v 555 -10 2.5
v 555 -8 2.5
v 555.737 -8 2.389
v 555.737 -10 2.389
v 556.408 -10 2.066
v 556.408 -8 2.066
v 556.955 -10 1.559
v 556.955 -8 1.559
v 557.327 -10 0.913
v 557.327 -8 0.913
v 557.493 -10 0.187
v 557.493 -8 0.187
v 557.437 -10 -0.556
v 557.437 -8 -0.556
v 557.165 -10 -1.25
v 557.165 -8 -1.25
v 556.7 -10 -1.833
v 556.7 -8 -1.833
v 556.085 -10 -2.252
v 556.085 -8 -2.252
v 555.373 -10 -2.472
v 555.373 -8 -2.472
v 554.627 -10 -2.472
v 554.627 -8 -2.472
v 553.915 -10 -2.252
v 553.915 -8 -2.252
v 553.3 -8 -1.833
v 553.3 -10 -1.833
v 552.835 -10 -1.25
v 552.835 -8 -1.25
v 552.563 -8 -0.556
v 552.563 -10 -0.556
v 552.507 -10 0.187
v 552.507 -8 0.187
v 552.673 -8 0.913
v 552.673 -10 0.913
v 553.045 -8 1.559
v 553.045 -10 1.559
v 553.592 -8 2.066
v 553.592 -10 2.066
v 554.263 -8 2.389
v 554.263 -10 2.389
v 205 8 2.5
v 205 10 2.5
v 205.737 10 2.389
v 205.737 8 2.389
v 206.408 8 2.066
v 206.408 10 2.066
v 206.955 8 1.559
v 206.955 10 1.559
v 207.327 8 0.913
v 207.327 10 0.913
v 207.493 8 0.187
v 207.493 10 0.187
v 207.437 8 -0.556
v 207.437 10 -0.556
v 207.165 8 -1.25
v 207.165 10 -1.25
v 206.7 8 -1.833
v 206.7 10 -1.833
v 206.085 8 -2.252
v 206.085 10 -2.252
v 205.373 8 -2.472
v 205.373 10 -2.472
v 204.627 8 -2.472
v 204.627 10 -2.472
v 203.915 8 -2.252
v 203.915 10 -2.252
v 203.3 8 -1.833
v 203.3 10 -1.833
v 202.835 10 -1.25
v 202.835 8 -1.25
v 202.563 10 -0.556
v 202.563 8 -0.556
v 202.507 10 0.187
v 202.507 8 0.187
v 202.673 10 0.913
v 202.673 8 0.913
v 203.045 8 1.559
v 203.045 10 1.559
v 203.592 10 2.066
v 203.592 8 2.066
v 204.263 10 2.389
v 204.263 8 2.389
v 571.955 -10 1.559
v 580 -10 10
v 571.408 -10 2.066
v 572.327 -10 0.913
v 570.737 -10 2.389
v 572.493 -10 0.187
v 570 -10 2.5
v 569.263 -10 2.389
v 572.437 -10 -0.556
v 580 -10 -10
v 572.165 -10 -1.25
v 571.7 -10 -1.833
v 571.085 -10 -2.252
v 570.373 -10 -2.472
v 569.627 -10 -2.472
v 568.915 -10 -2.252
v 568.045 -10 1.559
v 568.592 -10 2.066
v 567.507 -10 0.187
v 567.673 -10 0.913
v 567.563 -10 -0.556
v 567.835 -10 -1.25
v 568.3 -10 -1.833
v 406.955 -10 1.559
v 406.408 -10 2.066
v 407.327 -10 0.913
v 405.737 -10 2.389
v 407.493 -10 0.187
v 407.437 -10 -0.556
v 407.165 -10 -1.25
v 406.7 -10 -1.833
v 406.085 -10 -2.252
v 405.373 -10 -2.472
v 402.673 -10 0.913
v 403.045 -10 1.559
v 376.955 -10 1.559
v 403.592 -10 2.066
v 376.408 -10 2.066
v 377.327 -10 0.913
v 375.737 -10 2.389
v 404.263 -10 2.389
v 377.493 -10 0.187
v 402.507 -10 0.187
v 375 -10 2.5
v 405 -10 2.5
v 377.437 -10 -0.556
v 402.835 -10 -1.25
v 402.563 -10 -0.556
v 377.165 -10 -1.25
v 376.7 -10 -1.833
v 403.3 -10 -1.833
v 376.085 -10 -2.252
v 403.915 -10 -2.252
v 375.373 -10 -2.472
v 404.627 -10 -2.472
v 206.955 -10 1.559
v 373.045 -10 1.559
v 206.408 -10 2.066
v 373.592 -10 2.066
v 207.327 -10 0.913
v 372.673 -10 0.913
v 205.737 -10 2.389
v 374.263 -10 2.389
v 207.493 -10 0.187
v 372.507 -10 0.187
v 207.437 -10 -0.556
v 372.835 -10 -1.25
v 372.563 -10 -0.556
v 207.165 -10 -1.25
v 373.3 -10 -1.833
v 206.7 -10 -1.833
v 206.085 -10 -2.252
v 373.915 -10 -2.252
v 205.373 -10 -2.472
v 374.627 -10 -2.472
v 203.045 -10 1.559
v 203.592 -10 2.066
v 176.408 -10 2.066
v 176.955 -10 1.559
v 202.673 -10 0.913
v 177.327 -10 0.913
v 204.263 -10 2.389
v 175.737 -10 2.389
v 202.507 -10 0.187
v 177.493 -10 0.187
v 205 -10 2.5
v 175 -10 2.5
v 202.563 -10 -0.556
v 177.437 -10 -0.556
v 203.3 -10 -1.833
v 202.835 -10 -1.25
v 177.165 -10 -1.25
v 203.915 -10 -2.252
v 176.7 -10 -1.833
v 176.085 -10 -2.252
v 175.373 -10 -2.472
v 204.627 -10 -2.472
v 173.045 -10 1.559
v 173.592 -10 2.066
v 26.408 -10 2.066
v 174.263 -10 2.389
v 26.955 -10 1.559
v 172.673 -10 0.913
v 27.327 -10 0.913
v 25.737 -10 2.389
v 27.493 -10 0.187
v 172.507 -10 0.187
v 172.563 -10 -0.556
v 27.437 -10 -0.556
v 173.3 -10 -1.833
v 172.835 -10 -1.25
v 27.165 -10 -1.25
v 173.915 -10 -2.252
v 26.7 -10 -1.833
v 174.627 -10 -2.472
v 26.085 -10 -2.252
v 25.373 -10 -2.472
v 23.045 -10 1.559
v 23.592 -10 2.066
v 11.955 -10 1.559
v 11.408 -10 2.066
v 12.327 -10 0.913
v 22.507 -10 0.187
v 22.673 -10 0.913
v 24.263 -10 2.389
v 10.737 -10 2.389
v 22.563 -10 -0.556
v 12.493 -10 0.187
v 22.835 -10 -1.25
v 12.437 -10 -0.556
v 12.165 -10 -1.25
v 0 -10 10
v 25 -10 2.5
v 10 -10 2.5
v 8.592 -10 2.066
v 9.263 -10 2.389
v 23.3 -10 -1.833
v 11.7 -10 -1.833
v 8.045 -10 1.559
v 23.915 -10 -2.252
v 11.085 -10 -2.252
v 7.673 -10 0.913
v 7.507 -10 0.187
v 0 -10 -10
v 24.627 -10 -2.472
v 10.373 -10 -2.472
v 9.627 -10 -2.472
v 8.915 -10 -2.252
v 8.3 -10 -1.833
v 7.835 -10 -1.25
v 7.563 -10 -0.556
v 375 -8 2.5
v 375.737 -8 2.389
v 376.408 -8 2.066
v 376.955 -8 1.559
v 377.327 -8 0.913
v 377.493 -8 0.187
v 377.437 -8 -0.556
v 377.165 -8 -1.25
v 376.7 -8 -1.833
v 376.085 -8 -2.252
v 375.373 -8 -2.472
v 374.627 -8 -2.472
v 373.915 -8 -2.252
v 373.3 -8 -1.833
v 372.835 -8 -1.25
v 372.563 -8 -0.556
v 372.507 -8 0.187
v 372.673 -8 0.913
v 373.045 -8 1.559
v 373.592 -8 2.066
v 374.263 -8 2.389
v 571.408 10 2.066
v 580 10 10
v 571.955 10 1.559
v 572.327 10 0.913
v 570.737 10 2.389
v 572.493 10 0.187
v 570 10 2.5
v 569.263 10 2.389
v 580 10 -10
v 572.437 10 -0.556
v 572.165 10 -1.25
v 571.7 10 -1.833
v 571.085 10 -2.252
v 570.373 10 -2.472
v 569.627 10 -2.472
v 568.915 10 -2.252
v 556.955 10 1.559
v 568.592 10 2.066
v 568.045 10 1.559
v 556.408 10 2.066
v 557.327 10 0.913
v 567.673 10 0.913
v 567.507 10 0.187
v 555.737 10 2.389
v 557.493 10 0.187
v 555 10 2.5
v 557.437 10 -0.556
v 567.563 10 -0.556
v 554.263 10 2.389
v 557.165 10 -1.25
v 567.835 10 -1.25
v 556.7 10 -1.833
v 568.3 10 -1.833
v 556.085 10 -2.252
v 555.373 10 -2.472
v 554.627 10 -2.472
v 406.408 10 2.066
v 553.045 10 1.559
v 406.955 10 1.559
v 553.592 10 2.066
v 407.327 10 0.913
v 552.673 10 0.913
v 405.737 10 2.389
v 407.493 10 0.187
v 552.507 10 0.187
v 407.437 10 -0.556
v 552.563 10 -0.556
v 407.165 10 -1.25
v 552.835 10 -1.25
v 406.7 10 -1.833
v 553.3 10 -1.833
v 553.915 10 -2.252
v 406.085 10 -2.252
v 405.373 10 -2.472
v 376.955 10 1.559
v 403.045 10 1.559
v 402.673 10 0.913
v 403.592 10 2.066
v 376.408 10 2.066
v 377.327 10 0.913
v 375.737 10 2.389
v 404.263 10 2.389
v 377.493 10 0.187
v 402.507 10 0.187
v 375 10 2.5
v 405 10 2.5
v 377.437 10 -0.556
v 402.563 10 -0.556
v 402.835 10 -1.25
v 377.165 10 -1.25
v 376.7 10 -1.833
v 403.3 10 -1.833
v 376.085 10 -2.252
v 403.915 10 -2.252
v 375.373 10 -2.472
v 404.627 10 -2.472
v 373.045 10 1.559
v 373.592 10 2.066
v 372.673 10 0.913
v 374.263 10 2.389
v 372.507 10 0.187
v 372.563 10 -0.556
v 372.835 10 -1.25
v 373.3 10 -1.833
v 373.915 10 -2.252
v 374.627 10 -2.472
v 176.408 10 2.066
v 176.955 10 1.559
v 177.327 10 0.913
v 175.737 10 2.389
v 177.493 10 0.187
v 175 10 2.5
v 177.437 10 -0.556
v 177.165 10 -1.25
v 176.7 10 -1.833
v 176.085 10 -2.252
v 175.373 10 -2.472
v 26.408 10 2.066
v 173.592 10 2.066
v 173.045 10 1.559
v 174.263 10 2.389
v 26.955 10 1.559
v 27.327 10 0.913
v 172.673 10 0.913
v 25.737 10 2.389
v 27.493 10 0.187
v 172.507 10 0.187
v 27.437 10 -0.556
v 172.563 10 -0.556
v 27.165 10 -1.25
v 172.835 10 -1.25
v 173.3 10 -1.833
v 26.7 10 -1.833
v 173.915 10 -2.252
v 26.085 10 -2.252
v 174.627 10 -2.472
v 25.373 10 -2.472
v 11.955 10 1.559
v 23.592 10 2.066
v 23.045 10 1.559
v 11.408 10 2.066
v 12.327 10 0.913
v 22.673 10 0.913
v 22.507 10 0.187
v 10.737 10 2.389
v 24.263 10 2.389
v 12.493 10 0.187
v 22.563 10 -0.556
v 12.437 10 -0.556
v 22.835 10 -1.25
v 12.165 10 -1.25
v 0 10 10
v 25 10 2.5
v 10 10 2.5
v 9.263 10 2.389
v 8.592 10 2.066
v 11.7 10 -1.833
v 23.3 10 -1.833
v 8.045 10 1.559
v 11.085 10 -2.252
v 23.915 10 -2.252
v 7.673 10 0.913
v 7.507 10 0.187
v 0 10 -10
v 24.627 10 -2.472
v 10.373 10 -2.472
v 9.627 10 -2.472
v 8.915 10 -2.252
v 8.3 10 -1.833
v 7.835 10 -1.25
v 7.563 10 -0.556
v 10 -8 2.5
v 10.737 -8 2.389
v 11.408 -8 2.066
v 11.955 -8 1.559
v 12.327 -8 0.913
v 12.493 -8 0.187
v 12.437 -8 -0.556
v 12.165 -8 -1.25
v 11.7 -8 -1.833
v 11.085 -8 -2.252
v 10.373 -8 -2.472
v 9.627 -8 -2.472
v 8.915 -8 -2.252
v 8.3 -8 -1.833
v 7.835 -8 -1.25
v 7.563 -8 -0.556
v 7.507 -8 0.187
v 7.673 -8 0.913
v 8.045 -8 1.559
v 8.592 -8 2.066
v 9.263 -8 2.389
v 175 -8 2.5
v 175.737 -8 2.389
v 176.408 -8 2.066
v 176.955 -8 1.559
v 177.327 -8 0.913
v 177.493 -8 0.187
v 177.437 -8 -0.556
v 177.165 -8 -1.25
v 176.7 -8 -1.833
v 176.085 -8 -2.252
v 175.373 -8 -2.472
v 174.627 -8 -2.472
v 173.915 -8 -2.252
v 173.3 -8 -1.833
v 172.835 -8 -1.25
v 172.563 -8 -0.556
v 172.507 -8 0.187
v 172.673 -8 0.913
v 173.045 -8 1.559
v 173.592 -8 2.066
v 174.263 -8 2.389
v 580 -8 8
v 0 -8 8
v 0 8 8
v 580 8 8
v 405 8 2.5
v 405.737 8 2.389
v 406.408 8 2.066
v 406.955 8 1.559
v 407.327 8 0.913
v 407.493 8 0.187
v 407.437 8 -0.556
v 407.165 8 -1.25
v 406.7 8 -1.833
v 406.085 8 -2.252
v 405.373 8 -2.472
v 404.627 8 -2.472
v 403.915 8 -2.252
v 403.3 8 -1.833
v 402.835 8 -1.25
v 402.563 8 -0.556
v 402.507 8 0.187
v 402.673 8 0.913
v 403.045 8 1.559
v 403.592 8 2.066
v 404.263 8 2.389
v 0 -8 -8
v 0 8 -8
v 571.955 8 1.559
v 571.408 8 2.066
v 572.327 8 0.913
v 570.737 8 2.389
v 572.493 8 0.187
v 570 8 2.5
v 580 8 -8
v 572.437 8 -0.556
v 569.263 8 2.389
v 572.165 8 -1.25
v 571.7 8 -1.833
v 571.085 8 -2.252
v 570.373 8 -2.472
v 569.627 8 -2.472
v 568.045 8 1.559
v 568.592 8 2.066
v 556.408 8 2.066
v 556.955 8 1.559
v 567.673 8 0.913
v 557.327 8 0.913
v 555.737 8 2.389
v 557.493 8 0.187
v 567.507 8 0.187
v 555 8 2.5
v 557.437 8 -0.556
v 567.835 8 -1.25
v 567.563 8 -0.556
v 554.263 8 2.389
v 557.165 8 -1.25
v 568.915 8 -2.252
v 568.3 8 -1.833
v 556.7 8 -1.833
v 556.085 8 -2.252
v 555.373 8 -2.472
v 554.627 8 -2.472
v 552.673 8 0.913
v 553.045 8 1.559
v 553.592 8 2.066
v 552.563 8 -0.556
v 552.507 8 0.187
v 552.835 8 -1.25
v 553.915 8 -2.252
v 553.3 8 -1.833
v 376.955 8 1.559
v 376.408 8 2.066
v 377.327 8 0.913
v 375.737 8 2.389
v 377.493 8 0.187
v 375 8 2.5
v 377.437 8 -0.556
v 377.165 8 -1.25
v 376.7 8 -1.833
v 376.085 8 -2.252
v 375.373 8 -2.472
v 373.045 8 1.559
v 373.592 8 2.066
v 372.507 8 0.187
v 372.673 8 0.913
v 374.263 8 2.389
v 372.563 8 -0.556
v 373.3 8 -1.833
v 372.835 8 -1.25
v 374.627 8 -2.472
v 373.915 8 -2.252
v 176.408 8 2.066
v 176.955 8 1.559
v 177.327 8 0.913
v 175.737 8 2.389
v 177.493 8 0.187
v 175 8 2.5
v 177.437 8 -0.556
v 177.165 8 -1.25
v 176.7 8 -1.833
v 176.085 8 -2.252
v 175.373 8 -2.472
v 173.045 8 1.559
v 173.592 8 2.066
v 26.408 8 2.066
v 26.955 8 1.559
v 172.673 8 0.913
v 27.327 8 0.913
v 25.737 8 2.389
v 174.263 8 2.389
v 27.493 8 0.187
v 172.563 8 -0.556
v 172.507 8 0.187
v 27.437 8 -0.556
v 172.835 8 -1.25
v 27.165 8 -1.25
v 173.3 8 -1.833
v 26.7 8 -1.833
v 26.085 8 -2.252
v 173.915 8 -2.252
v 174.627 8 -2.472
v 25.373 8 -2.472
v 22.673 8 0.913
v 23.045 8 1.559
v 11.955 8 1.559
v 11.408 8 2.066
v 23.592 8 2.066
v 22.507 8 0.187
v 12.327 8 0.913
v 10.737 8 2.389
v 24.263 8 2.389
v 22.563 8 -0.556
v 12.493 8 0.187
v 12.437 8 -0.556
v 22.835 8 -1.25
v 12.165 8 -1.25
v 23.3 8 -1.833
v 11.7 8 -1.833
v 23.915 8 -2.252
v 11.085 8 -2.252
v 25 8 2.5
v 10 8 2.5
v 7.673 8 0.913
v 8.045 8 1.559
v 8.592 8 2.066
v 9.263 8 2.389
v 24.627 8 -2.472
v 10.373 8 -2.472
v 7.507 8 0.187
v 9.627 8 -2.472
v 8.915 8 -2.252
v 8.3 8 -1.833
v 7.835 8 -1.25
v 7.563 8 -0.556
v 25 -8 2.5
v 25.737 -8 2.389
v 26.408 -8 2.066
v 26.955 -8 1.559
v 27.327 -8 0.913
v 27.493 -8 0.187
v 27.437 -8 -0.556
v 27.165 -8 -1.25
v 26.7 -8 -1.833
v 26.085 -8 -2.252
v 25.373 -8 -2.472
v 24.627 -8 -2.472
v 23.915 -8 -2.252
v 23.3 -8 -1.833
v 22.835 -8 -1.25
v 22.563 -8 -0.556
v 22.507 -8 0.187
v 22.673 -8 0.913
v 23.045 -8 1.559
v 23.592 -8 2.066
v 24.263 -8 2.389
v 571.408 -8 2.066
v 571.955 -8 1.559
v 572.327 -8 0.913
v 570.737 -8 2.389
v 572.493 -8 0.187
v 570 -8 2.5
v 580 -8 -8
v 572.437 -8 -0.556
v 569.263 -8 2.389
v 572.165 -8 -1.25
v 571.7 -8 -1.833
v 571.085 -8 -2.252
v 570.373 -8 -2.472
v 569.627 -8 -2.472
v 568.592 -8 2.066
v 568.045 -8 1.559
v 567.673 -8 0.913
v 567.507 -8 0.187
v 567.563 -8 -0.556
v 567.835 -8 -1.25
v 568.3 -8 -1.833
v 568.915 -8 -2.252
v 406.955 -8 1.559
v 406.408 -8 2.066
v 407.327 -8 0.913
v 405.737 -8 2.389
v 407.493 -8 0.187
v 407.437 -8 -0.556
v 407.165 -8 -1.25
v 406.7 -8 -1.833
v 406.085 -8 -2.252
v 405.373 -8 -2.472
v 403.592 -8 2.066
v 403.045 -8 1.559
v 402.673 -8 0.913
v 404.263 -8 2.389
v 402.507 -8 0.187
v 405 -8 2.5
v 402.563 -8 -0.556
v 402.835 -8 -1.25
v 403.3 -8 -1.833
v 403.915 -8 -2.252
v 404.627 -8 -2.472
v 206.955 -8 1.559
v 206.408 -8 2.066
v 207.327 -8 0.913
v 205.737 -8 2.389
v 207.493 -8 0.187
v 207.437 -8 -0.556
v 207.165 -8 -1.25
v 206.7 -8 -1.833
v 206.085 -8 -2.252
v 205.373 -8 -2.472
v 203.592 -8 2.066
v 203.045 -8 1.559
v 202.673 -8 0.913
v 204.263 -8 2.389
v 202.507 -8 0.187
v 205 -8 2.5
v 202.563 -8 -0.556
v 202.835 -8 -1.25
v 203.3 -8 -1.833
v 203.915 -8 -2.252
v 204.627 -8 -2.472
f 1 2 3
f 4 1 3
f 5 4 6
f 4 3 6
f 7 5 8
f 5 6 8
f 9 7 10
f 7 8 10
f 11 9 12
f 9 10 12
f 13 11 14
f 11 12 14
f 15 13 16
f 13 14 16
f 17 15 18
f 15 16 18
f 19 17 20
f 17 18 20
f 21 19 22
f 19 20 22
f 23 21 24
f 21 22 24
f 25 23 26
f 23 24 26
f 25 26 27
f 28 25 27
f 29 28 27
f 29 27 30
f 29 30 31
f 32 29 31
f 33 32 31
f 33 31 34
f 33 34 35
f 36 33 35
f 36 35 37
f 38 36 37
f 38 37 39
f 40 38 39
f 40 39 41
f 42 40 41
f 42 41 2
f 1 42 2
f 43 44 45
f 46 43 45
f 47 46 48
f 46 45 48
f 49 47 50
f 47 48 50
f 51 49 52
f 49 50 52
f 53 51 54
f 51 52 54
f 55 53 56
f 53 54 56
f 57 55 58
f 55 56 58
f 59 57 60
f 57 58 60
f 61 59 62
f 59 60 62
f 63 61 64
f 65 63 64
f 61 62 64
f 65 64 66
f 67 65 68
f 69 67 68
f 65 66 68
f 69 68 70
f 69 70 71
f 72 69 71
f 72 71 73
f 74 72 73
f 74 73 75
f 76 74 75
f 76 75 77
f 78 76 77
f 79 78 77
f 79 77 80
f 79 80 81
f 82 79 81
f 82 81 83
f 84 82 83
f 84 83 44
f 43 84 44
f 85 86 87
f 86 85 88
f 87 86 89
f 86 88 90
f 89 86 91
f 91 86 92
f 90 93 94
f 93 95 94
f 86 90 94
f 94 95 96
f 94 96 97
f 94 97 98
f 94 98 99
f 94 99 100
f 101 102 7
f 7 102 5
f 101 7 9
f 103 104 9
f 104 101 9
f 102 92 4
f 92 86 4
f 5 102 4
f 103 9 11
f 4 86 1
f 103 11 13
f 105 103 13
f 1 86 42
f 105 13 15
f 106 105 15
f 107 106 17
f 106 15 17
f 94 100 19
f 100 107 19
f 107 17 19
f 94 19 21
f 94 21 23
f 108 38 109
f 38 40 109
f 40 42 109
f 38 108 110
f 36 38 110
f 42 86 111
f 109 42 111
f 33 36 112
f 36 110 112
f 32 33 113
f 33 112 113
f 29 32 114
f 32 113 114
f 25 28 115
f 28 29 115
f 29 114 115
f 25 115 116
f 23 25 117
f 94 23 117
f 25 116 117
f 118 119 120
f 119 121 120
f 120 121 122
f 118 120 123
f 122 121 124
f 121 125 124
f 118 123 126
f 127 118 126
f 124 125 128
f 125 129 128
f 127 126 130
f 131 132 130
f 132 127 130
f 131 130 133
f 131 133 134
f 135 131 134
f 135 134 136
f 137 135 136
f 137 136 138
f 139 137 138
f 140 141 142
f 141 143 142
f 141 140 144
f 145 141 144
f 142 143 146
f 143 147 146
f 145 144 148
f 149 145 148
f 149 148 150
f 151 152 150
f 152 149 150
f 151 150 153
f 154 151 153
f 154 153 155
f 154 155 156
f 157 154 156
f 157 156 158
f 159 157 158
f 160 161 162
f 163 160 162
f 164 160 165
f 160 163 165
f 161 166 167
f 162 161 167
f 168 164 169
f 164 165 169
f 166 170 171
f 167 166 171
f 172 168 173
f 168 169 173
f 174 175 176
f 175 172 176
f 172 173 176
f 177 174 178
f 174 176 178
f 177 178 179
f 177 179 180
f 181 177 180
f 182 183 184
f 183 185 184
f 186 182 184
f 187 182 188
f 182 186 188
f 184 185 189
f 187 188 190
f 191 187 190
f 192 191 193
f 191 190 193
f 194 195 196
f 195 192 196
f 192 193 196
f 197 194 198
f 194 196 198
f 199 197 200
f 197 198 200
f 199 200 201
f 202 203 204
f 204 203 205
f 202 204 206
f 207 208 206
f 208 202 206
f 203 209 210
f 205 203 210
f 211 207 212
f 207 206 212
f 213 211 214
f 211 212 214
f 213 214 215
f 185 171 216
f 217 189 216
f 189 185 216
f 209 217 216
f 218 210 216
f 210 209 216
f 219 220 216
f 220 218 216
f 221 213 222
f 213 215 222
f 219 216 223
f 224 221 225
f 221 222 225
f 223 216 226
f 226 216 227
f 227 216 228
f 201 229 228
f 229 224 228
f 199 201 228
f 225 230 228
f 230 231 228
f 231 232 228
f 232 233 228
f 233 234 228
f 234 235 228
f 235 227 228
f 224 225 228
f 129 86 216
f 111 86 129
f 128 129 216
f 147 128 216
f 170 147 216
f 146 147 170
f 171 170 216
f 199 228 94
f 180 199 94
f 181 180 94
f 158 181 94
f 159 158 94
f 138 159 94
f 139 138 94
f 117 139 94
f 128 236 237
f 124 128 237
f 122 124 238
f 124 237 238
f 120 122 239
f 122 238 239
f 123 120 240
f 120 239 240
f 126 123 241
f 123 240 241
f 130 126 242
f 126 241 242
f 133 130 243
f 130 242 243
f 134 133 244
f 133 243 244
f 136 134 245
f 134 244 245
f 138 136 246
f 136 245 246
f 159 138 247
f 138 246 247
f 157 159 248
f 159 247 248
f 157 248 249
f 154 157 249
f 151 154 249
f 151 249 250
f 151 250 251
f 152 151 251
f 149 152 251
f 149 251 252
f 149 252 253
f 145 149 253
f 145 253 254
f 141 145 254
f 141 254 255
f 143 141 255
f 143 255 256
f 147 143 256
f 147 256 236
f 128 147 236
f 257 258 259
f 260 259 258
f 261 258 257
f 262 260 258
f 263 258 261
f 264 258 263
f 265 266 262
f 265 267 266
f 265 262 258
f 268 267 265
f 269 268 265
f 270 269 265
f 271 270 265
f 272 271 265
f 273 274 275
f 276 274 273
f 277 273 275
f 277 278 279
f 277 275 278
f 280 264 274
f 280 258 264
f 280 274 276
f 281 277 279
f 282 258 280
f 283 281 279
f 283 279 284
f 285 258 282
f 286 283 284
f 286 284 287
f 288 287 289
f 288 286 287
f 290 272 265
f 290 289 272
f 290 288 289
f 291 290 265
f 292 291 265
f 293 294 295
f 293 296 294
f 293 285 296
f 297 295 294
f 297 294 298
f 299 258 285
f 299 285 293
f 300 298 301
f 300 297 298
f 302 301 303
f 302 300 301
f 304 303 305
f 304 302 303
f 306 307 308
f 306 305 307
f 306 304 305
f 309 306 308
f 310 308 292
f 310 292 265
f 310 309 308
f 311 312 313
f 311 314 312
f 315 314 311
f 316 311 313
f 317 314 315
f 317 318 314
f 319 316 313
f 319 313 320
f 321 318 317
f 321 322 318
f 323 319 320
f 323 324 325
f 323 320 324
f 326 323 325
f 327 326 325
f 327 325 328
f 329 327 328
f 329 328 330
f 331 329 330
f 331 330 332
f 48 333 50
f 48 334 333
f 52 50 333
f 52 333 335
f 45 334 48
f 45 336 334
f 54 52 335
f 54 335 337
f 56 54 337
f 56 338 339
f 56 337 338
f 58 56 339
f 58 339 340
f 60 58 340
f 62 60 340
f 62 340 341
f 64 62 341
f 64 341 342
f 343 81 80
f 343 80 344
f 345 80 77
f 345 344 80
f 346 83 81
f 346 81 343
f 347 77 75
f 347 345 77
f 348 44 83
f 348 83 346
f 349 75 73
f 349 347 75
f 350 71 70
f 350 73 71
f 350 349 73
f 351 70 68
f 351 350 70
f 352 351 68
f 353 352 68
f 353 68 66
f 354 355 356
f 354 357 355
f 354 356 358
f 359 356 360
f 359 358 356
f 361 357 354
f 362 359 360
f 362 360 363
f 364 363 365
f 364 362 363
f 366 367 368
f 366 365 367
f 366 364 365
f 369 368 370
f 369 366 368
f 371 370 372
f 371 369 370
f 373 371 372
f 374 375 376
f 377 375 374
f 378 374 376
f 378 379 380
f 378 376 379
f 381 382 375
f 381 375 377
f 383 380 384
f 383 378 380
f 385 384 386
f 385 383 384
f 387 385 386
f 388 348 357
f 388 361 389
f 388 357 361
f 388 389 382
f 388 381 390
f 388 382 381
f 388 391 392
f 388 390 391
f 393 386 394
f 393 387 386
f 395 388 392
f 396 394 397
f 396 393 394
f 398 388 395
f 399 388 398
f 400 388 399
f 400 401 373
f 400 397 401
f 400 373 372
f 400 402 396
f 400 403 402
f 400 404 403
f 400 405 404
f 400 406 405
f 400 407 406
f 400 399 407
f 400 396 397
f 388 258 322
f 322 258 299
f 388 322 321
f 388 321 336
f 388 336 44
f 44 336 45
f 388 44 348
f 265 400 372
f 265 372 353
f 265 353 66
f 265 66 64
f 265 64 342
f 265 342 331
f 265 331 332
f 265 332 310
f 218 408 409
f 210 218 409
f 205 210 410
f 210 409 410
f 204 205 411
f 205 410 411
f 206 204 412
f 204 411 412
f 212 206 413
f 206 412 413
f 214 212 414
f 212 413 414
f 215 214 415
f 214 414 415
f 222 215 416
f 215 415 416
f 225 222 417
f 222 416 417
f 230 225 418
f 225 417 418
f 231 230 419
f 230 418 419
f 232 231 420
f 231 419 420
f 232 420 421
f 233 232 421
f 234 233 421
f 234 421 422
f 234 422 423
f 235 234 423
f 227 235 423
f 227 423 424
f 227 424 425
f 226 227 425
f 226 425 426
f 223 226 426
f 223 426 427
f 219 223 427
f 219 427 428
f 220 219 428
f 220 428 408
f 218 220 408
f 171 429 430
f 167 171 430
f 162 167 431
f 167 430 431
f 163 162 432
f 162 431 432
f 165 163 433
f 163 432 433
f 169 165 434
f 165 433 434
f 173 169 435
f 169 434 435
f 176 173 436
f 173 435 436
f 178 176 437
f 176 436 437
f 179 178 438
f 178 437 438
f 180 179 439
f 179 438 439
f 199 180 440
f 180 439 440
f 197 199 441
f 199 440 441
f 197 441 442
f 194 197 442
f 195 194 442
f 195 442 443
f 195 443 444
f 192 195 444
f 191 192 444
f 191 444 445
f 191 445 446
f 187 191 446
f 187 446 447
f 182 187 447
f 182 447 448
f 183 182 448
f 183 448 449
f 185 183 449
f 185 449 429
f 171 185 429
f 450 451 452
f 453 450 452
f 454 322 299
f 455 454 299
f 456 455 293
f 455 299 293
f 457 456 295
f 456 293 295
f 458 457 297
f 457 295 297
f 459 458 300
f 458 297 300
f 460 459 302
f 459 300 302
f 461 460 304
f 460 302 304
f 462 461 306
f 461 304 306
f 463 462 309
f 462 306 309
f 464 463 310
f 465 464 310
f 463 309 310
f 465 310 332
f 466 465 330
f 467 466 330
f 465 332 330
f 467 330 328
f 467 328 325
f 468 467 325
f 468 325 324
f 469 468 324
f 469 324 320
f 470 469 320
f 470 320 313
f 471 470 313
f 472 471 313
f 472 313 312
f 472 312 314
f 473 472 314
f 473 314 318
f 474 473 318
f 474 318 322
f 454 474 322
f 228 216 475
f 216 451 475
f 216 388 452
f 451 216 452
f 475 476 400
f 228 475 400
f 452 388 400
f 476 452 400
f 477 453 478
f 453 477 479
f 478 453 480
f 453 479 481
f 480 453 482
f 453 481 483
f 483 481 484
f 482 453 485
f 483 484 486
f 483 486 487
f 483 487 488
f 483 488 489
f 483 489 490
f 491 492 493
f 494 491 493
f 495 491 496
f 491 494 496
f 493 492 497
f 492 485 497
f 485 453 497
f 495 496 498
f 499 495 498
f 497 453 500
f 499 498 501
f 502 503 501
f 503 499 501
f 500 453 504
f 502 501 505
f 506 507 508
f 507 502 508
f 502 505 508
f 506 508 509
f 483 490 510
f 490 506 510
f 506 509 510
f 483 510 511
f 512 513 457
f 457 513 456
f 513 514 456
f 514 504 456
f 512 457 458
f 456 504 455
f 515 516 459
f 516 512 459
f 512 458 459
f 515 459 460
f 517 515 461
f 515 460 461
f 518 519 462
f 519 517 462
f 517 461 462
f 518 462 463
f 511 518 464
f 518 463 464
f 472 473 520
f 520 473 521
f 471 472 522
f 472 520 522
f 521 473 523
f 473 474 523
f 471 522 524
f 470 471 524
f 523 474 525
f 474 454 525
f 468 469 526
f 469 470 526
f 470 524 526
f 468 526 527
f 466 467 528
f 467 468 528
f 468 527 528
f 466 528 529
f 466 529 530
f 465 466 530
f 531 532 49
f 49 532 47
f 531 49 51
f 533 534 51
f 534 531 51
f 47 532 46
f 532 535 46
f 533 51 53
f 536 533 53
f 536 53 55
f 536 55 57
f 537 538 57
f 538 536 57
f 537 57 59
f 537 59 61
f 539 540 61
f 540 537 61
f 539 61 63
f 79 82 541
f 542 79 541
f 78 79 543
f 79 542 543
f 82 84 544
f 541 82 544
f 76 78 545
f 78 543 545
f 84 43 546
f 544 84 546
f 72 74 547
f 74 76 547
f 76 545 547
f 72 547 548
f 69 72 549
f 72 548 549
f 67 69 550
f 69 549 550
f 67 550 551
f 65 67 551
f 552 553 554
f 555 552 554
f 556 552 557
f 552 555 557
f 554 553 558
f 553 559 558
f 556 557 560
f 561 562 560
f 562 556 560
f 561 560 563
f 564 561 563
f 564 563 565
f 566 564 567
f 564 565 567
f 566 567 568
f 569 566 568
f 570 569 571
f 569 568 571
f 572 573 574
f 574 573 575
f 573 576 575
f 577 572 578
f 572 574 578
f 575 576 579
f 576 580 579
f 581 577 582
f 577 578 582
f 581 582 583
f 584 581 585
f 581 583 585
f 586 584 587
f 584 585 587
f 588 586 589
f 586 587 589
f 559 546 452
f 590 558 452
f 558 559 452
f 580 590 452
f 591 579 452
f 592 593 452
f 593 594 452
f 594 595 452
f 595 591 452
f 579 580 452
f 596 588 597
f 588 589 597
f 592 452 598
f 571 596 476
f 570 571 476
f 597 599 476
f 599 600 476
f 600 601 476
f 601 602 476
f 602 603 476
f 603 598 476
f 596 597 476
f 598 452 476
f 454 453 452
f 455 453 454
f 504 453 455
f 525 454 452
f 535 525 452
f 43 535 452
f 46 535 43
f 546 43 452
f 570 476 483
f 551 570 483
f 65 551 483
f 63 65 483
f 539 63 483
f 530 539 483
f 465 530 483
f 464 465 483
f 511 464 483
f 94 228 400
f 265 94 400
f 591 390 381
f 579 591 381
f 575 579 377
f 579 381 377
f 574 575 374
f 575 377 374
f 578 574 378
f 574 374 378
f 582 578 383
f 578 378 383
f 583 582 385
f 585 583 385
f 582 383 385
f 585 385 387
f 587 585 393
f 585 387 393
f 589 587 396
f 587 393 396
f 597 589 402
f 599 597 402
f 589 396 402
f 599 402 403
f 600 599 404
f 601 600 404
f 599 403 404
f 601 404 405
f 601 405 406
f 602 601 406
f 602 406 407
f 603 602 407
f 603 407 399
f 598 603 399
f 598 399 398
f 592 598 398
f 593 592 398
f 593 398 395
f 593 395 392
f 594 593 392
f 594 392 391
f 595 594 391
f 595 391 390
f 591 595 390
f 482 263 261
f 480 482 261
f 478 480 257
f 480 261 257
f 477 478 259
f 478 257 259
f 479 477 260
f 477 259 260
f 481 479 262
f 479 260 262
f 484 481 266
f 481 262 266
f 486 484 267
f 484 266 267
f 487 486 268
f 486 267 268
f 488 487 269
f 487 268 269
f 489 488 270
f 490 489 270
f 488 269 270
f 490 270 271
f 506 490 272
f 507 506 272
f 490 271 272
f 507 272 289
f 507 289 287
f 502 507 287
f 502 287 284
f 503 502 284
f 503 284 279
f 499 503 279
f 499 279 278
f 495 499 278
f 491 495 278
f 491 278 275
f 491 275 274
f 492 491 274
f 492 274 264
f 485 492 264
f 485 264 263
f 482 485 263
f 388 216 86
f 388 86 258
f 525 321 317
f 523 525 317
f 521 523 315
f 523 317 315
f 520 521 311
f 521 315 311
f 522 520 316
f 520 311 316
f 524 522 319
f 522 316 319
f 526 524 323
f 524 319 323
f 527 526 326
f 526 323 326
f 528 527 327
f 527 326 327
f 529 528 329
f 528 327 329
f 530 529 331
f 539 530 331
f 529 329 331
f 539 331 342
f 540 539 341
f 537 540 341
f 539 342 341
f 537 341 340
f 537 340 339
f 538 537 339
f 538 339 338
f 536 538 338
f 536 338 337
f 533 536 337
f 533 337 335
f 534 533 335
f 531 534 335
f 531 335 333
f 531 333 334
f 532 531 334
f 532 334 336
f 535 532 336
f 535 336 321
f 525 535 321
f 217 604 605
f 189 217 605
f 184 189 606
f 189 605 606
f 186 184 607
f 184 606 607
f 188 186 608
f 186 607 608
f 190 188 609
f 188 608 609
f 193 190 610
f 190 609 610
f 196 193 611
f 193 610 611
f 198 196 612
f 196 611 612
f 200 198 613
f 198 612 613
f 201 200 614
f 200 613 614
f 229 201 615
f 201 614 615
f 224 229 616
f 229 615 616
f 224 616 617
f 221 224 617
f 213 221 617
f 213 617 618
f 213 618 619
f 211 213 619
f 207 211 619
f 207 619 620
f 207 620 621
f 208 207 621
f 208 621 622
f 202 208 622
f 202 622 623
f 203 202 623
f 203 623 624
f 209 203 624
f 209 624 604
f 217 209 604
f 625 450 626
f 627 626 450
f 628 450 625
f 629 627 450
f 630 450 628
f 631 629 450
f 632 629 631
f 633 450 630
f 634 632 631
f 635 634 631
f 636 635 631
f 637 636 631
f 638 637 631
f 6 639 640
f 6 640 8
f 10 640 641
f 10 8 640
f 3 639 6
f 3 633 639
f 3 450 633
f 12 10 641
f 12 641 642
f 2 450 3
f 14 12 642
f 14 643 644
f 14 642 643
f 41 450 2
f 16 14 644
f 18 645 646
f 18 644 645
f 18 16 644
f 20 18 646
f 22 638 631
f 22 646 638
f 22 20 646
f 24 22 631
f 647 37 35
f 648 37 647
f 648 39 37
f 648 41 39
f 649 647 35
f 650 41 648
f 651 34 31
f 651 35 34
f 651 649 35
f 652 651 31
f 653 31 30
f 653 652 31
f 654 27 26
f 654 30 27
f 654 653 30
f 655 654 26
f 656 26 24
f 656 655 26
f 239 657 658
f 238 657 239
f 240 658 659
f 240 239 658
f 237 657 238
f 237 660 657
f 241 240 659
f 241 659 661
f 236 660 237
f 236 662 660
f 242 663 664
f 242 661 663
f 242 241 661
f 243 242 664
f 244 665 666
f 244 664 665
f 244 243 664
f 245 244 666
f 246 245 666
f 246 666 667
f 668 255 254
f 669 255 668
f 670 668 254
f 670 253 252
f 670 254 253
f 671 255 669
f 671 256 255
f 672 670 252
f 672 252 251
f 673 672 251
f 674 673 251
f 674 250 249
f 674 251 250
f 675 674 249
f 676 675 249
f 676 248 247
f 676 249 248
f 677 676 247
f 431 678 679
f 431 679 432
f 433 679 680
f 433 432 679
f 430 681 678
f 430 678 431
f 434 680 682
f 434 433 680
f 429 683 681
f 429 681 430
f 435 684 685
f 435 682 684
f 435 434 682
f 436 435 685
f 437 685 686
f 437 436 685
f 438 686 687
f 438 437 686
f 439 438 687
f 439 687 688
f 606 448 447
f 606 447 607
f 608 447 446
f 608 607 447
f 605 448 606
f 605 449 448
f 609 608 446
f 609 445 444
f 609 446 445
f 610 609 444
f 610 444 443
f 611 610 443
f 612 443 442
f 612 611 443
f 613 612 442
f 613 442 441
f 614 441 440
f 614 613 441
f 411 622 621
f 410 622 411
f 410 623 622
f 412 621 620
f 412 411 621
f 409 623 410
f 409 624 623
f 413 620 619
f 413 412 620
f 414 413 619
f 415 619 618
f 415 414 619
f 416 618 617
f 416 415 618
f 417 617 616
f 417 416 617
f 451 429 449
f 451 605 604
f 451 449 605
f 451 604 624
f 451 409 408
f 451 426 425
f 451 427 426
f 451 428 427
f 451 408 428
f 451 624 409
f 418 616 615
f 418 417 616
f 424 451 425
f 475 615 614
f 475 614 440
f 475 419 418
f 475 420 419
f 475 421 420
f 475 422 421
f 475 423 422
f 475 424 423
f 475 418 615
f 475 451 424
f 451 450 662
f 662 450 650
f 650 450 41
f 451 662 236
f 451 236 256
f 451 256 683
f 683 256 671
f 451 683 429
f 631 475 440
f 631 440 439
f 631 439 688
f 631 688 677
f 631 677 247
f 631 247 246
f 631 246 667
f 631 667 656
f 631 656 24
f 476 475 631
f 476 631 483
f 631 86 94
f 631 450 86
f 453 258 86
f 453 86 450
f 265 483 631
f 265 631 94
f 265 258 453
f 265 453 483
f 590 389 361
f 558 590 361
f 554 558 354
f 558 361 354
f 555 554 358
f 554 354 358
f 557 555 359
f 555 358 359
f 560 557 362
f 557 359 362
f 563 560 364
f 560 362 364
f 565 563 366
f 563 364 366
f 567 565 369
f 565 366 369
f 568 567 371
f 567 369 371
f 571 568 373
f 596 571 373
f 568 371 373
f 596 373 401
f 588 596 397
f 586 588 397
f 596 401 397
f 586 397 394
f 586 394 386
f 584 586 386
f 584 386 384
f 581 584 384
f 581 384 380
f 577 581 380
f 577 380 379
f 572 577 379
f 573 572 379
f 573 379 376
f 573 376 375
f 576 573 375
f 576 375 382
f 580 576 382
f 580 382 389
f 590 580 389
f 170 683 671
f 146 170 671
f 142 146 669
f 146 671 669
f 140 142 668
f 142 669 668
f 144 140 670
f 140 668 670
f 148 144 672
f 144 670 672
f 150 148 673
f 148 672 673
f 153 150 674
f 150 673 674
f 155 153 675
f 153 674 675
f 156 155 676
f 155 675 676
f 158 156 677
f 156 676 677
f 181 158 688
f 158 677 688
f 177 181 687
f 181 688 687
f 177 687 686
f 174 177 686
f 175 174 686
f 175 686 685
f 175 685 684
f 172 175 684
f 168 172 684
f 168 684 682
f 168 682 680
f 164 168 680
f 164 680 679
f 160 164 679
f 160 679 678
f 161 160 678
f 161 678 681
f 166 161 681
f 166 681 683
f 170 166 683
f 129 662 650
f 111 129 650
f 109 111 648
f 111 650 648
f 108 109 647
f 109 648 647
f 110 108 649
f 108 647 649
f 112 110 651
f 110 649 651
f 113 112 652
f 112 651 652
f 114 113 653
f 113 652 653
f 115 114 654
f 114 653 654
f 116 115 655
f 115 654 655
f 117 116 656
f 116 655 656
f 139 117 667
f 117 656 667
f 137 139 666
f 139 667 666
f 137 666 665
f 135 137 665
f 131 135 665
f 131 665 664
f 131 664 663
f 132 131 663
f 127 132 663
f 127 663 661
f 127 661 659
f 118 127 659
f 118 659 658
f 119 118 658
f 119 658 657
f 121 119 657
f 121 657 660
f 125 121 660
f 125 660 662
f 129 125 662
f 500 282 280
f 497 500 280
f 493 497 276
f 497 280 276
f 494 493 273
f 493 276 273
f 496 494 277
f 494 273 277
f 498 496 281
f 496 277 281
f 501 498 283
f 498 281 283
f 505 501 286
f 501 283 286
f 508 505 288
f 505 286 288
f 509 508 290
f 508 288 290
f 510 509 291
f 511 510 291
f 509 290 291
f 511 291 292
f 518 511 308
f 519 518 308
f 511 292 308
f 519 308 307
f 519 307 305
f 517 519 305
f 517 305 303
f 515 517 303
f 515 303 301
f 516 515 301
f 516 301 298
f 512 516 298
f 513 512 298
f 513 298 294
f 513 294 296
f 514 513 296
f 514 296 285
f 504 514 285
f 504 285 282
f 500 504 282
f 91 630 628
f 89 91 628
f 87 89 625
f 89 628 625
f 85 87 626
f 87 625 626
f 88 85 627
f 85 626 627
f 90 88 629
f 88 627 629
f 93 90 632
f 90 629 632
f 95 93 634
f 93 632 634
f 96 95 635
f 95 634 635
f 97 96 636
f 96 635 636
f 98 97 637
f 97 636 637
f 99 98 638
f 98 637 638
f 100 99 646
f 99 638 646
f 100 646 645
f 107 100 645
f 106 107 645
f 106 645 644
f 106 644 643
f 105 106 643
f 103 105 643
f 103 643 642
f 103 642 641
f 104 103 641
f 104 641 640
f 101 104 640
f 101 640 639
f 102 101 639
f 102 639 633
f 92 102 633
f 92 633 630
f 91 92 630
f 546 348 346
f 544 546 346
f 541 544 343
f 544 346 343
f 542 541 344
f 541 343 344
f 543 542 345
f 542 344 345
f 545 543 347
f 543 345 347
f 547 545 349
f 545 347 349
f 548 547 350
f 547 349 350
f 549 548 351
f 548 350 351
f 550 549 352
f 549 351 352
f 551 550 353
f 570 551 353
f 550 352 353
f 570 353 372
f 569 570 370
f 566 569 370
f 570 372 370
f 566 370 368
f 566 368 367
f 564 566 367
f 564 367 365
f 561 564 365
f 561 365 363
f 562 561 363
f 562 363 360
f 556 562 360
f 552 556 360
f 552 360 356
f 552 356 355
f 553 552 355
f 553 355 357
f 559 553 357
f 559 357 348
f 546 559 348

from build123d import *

# Parameters (mm, degrees)
SKETCH1_W           = 20
SKETCH1_H           = 20
SKETCH1_W_2         = 16
SKETCH1_H_2         = 16
BOSS_EXTRUDE1_DEPTH = 580
SKETCH2_R           = 2.5
CUT_EXTRUDE1_DEPTH  = 581.430874437
SKETCH3_R           = 2.5
CUT_EXTRUDE2_DEPTH  = 581.430874437


with BuildPart() as part:
    # Sketch1 → Boss-Extrude1 (new body)
    with BuildSketch(Plane(origin=(0, 0, 0), x_dir=(0, 0, -1), z_dir=(1, 0, 0))):
        Rectangle(SKETCH1_W, SKETCH1_H)
        Rectangle(SKETCH1_W_2, SKETCH1_H_2, mode=Mode.SUBTRACT)
    extrude(amount=BOSS_EXTRUDE1_DEPTH)

    # Sketch2 → Cut-Extrude1 (cut, through all)
    with BuildSketch(Plane(origin=(0, 10, 0), x_dir=(1, 0, 0), z_dir=(0, 1, 0))):
        with Locations(Location((10, 0, 0), (0, 0, 270))):
            Circle(SKETCH2_R)
        with Locations(Location((570, 0, 0), (0, 0, 270))):
            Circle(SKETCH2_R)
        with Locations(Location((25, 0, 0), (0, 0, 270))):
            Circle(SKETCH2_R)
        with Locations(Location((555, 0, 0), (0, 0, 270))):
            Circle(SKETCH2_R)
    extrude(amount=-CUT_EXTRUDE1_DEPTH, mode=Mode.SUBTRACT)

    # Sketch3 → Cut-Extrude2 (cut, through all)
    with BuildSketch(Plane(origin=(0, 10, 0), x_dir=(1, 0, 0), z_dir=(0, 1, 0))):
        with Locations(Location((175, 0, 0), (0, 0, 270))):
            Circle(SKETCH3_R)
        with Locations(Location((405, 0, 0), (0, 0, 270))):
            Circle(SKETCH3_R)
        with Locations(Location((205, 0, 0), (0, 0, 270))):
            Circle(SKETCH3_R)
        with Locations(Location((375, 0, 0), (0, 0, 270))):
            Circle(SKETCH3_R)
    extrude(amount=-CUT_EXTRUDE2_DEPTH, mode=Mode.SUBTRACT)


solid = part.part
